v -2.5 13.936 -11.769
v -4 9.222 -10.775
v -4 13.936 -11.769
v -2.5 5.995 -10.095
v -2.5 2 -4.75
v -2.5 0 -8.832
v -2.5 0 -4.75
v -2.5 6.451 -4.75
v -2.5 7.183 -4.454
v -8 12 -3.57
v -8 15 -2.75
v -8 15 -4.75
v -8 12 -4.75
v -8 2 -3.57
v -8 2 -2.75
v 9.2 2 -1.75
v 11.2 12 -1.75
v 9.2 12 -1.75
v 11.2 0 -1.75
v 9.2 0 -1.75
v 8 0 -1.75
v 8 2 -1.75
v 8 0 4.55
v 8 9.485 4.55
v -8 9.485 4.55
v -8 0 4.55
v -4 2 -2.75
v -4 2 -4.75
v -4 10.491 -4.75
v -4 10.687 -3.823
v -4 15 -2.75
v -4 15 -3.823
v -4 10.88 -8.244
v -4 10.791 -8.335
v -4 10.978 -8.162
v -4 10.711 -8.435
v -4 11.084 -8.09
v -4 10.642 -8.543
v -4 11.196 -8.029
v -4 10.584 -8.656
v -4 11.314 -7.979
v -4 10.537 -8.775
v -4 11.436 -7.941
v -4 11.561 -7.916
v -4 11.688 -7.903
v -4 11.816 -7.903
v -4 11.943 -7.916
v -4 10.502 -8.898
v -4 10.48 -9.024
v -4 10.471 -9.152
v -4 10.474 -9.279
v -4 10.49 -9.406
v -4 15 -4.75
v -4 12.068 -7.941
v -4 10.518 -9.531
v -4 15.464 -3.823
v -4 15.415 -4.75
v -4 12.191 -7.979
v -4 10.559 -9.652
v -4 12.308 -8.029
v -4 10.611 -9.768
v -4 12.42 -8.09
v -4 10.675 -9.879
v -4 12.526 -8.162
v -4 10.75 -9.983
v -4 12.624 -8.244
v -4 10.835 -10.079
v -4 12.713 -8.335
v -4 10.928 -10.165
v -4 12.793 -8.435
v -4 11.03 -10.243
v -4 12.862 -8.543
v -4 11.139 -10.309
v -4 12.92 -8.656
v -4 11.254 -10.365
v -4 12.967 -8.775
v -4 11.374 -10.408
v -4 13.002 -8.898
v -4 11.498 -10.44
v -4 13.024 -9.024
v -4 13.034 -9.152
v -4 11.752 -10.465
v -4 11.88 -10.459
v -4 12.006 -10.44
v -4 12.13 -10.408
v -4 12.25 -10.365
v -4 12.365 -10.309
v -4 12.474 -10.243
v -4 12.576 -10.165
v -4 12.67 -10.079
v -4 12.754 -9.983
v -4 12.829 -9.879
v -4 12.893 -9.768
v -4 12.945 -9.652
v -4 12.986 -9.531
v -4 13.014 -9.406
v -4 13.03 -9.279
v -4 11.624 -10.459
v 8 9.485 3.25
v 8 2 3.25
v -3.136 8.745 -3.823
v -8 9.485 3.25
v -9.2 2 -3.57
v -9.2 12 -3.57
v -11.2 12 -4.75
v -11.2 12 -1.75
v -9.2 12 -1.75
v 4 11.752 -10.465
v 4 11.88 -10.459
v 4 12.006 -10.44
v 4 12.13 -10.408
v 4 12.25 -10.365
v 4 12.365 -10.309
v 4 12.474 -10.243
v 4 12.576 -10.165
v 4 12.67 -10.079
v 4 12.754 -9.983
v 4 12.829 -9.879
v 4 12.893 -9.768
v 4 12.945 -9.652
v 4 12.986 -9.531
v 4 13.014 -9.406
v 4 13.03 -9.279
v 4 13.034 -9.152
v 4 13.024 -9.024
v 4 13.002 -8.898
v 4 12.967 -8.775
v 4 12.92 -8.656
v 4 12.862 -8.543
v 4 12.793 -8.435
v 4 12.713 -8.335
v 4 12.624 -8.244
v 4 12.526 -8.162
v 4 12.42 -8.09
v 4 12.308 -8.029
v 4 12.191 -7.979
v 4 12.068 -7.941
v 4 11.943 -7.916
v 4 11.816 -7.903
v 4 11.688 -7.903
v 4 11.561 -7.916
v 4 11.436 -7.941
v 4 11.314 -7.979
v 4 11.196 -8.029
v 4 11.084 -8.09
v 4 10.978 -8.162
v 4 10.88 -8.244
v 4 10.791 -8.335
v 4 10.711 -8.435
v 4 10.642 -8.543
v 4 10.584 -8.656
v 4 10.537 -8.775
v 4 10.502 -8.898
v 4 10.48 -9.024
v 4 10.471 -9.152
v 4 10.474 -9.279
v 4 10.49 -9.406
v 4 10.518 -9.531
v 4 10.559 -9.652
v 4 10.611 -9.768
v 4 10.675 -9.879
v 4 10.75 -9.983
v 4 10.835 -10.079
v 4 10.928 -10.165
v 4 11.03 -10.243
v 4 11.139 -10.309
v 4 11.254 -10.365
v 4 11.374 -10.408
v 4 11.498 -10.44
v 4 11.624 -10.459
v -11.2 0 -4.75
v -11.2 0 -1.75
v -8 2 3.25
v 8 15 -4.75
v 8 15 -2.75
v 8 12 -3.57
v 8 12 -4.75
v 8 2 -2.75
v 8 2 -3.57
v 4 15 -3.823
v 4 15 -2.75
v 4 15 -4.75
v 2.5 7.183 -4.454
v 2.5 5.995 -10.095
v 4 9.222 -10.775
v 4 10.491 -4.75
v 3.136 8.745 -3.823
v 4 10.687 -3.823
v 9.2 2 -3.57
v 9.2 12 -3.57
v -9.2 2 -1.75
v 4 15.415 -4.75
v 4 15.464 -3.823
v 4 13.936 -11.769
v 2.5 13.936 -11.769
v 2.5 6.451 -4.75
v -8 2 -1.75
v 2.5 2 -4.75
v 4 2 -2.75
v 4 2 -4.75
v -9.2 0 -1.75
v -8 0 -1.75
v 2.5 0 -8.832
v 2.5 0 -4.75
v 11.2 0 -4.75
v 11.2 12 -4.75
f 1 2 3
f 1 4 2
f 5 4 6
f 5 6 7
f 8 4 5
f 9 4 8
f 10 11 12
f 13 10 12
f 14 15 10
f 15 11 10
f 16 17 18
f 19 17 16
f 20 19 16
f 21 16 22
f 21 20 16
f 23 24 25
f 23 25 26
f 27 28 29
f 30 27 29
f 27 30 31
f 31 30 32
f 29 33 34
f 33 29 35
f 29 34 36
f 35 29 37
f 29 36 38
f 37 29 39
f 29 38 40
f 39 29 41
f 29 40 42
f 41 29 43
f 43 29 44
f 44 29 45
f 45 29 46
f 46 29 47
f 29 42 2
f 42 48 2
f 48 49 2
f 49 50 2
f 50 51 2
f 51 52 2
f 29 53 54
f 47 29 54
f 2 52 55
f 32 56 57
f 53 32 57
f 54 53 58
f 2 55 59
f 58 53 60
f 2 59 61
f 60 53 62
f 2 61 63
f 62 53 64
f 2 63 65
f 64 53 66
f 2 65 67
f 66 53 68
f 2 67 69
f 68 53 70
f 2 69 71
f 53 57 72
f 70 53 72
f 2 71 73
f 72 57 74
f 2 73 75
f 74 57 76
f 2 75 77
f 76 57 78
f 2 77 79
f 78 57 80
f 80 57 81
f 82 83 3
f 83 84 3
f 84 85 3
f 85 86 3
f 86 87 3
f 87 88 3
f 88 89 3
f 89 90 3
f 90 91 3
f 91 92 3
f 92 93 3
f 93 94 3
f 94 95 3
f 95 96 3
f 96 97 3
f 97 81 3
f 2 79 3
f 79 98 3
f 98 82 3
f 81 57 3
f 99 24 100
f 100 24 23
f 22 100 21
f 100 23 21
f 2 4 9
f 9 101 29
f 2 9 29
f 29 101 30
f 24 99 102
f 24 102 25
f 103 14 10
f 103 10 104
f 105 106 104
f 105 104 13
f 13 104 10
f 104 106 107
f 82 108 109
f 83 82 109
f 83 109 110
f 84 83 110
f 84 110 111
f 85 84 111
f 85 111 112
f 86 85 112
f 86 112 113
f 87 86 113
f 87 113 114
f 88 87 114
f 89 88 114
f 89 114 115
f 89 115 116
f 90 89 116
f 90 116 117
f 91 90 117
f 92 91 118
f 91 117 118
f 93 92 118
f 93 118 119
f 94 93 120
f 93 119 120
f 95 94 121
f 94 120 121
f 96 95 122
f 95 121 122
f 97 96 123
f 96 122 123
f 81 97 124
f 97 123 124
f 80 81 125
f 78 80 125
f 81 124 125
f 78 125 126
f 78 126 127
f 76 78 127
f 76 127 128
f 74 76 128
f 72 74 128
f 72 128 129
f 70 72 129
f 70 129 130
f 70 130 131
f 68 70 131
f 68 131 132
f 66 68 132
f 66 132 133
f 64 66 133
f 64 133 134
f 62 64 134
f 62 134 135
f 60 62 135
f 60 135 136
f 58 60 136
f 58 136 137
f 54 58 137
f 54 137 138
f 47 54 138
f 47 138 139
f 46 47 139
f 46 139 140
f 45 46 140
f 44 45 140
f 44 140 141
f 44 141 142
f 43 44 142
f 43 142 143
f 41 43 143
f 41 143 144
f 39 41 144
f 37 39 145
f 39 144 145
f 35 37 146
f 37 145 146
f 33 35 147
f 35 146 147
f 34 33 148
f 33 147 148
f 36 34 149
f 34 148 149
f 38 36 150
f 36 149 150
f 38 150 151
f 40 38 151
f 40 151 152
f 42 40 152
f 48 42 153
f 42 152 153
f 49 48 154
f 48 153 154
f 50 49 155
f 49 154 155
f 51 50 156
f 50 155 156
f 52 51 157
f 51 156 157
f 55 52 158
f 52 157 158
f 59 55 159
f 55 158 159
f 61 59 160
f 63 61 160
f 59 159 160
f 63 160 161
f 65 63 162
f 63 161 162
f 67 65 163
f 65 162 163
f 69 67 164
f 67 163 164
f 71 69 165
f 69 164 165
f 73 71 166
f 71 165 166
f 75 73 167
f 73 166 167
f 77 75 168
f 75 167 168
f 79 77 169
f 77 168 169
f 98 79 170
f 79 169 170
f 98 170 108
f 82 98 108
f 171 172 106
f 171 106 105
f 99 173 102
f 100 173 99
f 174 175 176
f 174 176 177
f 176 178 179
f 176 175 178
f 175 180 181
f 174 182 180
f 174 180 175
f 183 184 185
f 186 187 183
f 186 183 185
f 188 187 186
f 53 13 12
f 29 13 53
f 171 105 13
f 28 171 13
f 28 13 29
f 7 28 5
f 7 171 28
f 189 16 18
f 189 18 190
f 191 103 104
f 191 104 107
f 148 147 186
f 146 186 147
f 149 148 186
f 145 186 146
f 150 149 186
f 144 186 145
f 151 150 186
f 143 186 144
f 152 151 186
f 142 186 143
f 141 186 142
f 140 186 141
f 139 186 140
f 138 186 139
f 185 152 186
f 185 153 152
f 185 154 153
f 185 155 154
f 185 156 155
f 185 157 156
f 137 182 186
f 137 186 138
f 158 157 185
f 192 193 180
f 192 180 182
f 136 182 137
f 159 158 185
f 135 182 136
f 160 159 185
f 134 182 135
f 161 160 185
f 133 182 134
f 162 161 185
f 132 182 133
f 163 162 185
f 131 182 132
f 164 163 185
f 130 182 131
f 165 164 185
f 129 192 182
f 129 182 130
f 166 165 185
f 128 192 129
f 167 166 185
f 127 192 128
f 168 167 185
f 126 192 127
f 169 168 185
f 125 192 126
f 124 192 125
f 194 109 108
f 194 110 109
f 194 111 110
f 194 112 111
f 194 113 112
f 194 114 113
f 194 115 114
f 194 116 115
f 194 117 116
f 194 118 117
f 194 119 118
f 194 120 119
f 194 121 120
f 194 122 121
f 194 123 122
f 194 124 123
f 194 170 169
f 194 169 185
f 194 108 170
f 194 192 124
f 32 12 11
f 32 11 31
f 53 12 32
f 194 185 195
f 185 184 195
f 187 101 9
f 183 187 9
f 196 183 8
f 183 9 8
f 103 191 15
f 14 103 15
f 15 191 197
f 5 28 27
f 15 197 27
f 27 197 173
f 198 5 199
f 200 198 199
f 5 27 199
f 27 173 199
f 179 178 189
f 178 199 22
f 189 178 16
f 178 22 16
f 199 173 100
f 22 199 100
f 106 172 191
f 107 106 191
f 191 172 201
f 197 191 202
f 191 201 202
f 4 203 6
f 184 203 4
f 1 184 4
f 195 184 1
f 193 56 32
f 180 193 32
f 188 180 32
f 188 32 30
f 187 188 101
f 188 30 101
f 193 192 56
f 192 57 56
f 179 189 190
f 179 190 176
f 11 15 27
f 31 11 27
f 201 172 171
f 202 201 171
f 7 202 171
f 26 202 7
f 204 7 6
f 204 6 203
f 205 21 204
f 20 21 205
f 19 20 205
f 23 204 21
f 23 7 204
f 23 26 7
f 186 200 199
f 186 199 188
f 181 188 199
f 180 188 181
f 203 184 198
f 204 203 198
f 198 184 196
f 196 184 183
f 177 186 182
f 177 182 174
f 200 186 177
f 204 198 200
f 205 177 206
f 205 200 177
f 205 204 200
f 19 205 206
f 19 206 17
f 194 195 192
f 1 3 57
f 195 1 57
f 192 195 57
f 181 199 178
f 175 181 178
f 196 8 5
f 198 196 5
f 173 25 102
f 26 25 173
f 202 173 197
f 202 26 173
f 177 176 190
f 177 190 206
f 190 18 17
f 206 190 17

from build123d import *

# Parameters (mm, degrees)
SKETCH_1_W          = 16
SKETCH_1_H          = 6
EXTRUDE_1_DEPTH     = 2
SKETCH_1_3_W        = 16
SKETCH_1_3_H        = 2
SKETCH_1_3_H_2      = 1.5
EXTRUDE_2_DEPTH     = 15
SKETCH_2_W          = 8
SKETCH_2_H          = 26
CUT_EXTRUDE_1_DEPTH = 2
EXTRUDE_3_DEPTH     = 2.5
EXTRUDE_4_DEPTH     = 5
EXTRUDE_5_DEPTH     = 1.5
SKETCH_9_W          = 1.2
SKETCH_9_H          = 1.820432063
EXTRUDE_6_DEPTH     = 2
EXTRUDE_7_DEPTH     = 12
CUT_EXTRUDE_START   = -7.10494
CUT_EXTRUDE_2_DEPTH = 7.10494
SKETCH_12_R         = 1.281793471
CUT_EXTRUDE_3_DEPTH = 10
CUT_EXTRUDE_4_DEPTH = 20.2


with BuildPart() as part:
    # 草图1 → 凸台-拉伸1 (new body)
    with BuildSketch(Plane(origin=(0, 0, 0), x_dir=(1, 0, 0), z_dir=(0, 1, 0))):
        with Locations((0, -0.25)):
            Rectangle(SKETCH_1_W, SKETCH_1_H)
    extrude(amount=EXTRUDE_1_DEPTH)

    # 草图1<3> → 凸台-拉伸2 (add)
    with BuildSketch(Plane(origin=(0, 0, 0), x_dir=(1, 0, 0), z_dir=(0, 1, 0))):
        with Locations((0, 3.75)):
            Rectangle(SKETCH_1_3_W, SKETCH_1_3_H)
        with Locations((0, -4)):
            Rectangle(SKETCH_1_3_W, SKETCH_1_3_H_2)
    extrude(amount=EXTRUDE_2_DEPTH)

    # 草图2 → 切除-拉伸1 (cut)
    with BuildSketch(Plane(origin=(0, 0, -4.75), x_dir=(-1, 0, 0), z_dir=(0, 0, -1))):
        with Locations((0, 15)):
            Rectangle(SKETCH_2_W, SKETCH_2_H)
    extrude(amount=-CUT_EXTRUDE_1_DEPTH, mode=Mode.SUBTRACT)

    # 草图3 → 凸台-拉伸3 (add, symmetric)
    with BuildSketch(Plane(origin=(0, 0, 0), x_dir=(0, 0, -1), z_dir=(1, 0, 0))):
        Polygon((4.75, 0), (8.831597644, 0), (11.768525918, 13.935665169), (4.75, 15.414812878), align=None)
    extrude(amount=EXTRUDE_3_DEPTH, both=True)

    # 草图5 → 凸台-拉伸4 (add)
    with BuildSketch(Plane(origin=(2.5, 0, 0), x_dir=(0, 0, -1), z_dir=(1, 0, 0))):
        Polygon((4.75, 6.451105389), (3.822798244, 8.744995241), (3.822798244, 15.463750373), (4.75, 15.414812878), align=None)
    extrude(amount=-EXTRUDE_4_DEPTH)

    # 草图6 → 凸台-拉伸5 (add)
    with BuildSketch(Plane.ZY.offset(2.5)):
        Polygon((-4.75, 6.451105389), (-10.094945569, 5.994560313), (-11.768525918, 13.935665169), (-4.75, 15.414812878), (-3.822798244, 15.463750373), (-3.822798244, 8.744995241), align=None)
    extrude_5 = extrude(amount=EXTRUDE_5_DEPTH)

    # 草图9 → 凸台-拉伸6 (add)
    with BuildSketch(Plane.XZ):
        with Locations((8.6, -2.660216032)):
            Rectangle(SKETCH_9_W, SKETCH_9_H)
        with Locations((-8.6, -2.660216032)):
            Rectangle(SKETCH_9_W, SKETCH_9_H)
    extrude(amount=-EXTRUDE_6_DEPTH)

    # 草图9<3> → 凸台-拉伸7 (add)
    with BuildSketch(Plane.XZ):
        Polygon((8, -3.570432063), (8, -4.75), (11.2, -4.75), (11.2, -1.75), (9.2, -1.75), (9.2, -3.570432063), align=None)
        Polygon((-8, -4.75), (-8, -3.570432063), (-9.2, -3.570432063), (-9.2, -1.75), (-11.2, -1.75), (-11.2, -4.75), align=None)
    extrude(amount=-EXTRUDE_7_DEPTH)

    # 草图11 → 切除-拉伸2 (cut)
    with BuildSketch(Plane(origin=(0, -1.782098659, -8.456022034), x_dir=(-1, 0, 0), z_dir=(0, -0.206219179, -0.978505825)).offset(CUT_EXTRUDE_START)):
        Polygon((2.5, 7.947483572), (4, 11.245323919), (4, 7.947483572), (4, 5.815044055), (2.5, 5.815044055), align=None)
    cut_extrude_2 = extrude(amount=CUT_EXTRUDE_2_DEPTH, mode=Mode.SUBTRACT)

    # 镜向1: 凸台-拉伸5, 切除-拉伸2 across plane
    add(extrude_5.mirror(Plane(origin=(0, 0, 0), x_dir=(0, 0, 1), z_dir=(1, 0, 0))))
    add(cut_extrude_2.mirror(Plane(origin=(0, 0, 0), x_dir=(0, 0, 1), z_dir=(1, 0, 0))), mode=Mode.SUBTRACT)

    # 草图12 → 切除-拉伸3 (cut)
    with BuildSketch(Plane(origin=(4, 0, 0), x_dir=(0, 0, -1), z_dir=(1, 0, 0))):
        with Locations((9.183579002, 11.7521089)):
            Circle(SKETCH_12_R)
    extrude(amount=-CUT_EXTRUDE_3_DEPTH, mode=Mode.SUBTRACT)

    # 草图13 → 切除-拉伸4 (cut, through all)
    with BuildSketch(Plane(origin=(8, 0, 0), x_dir=(0, 0, -1), z_dir=(1, 0, 0))):
        Polygon((-3.25, 9.484512334), (-4.55, 9.484512334), (-4.55, 0), (-4.75, 0), (-4.75, 15), (-3.25, 15), align=None)
    extrude(amount=-CUT_EXTRUDE_4_DEPTH, mode=Mode.SUBTRACT)


solid = part.part
